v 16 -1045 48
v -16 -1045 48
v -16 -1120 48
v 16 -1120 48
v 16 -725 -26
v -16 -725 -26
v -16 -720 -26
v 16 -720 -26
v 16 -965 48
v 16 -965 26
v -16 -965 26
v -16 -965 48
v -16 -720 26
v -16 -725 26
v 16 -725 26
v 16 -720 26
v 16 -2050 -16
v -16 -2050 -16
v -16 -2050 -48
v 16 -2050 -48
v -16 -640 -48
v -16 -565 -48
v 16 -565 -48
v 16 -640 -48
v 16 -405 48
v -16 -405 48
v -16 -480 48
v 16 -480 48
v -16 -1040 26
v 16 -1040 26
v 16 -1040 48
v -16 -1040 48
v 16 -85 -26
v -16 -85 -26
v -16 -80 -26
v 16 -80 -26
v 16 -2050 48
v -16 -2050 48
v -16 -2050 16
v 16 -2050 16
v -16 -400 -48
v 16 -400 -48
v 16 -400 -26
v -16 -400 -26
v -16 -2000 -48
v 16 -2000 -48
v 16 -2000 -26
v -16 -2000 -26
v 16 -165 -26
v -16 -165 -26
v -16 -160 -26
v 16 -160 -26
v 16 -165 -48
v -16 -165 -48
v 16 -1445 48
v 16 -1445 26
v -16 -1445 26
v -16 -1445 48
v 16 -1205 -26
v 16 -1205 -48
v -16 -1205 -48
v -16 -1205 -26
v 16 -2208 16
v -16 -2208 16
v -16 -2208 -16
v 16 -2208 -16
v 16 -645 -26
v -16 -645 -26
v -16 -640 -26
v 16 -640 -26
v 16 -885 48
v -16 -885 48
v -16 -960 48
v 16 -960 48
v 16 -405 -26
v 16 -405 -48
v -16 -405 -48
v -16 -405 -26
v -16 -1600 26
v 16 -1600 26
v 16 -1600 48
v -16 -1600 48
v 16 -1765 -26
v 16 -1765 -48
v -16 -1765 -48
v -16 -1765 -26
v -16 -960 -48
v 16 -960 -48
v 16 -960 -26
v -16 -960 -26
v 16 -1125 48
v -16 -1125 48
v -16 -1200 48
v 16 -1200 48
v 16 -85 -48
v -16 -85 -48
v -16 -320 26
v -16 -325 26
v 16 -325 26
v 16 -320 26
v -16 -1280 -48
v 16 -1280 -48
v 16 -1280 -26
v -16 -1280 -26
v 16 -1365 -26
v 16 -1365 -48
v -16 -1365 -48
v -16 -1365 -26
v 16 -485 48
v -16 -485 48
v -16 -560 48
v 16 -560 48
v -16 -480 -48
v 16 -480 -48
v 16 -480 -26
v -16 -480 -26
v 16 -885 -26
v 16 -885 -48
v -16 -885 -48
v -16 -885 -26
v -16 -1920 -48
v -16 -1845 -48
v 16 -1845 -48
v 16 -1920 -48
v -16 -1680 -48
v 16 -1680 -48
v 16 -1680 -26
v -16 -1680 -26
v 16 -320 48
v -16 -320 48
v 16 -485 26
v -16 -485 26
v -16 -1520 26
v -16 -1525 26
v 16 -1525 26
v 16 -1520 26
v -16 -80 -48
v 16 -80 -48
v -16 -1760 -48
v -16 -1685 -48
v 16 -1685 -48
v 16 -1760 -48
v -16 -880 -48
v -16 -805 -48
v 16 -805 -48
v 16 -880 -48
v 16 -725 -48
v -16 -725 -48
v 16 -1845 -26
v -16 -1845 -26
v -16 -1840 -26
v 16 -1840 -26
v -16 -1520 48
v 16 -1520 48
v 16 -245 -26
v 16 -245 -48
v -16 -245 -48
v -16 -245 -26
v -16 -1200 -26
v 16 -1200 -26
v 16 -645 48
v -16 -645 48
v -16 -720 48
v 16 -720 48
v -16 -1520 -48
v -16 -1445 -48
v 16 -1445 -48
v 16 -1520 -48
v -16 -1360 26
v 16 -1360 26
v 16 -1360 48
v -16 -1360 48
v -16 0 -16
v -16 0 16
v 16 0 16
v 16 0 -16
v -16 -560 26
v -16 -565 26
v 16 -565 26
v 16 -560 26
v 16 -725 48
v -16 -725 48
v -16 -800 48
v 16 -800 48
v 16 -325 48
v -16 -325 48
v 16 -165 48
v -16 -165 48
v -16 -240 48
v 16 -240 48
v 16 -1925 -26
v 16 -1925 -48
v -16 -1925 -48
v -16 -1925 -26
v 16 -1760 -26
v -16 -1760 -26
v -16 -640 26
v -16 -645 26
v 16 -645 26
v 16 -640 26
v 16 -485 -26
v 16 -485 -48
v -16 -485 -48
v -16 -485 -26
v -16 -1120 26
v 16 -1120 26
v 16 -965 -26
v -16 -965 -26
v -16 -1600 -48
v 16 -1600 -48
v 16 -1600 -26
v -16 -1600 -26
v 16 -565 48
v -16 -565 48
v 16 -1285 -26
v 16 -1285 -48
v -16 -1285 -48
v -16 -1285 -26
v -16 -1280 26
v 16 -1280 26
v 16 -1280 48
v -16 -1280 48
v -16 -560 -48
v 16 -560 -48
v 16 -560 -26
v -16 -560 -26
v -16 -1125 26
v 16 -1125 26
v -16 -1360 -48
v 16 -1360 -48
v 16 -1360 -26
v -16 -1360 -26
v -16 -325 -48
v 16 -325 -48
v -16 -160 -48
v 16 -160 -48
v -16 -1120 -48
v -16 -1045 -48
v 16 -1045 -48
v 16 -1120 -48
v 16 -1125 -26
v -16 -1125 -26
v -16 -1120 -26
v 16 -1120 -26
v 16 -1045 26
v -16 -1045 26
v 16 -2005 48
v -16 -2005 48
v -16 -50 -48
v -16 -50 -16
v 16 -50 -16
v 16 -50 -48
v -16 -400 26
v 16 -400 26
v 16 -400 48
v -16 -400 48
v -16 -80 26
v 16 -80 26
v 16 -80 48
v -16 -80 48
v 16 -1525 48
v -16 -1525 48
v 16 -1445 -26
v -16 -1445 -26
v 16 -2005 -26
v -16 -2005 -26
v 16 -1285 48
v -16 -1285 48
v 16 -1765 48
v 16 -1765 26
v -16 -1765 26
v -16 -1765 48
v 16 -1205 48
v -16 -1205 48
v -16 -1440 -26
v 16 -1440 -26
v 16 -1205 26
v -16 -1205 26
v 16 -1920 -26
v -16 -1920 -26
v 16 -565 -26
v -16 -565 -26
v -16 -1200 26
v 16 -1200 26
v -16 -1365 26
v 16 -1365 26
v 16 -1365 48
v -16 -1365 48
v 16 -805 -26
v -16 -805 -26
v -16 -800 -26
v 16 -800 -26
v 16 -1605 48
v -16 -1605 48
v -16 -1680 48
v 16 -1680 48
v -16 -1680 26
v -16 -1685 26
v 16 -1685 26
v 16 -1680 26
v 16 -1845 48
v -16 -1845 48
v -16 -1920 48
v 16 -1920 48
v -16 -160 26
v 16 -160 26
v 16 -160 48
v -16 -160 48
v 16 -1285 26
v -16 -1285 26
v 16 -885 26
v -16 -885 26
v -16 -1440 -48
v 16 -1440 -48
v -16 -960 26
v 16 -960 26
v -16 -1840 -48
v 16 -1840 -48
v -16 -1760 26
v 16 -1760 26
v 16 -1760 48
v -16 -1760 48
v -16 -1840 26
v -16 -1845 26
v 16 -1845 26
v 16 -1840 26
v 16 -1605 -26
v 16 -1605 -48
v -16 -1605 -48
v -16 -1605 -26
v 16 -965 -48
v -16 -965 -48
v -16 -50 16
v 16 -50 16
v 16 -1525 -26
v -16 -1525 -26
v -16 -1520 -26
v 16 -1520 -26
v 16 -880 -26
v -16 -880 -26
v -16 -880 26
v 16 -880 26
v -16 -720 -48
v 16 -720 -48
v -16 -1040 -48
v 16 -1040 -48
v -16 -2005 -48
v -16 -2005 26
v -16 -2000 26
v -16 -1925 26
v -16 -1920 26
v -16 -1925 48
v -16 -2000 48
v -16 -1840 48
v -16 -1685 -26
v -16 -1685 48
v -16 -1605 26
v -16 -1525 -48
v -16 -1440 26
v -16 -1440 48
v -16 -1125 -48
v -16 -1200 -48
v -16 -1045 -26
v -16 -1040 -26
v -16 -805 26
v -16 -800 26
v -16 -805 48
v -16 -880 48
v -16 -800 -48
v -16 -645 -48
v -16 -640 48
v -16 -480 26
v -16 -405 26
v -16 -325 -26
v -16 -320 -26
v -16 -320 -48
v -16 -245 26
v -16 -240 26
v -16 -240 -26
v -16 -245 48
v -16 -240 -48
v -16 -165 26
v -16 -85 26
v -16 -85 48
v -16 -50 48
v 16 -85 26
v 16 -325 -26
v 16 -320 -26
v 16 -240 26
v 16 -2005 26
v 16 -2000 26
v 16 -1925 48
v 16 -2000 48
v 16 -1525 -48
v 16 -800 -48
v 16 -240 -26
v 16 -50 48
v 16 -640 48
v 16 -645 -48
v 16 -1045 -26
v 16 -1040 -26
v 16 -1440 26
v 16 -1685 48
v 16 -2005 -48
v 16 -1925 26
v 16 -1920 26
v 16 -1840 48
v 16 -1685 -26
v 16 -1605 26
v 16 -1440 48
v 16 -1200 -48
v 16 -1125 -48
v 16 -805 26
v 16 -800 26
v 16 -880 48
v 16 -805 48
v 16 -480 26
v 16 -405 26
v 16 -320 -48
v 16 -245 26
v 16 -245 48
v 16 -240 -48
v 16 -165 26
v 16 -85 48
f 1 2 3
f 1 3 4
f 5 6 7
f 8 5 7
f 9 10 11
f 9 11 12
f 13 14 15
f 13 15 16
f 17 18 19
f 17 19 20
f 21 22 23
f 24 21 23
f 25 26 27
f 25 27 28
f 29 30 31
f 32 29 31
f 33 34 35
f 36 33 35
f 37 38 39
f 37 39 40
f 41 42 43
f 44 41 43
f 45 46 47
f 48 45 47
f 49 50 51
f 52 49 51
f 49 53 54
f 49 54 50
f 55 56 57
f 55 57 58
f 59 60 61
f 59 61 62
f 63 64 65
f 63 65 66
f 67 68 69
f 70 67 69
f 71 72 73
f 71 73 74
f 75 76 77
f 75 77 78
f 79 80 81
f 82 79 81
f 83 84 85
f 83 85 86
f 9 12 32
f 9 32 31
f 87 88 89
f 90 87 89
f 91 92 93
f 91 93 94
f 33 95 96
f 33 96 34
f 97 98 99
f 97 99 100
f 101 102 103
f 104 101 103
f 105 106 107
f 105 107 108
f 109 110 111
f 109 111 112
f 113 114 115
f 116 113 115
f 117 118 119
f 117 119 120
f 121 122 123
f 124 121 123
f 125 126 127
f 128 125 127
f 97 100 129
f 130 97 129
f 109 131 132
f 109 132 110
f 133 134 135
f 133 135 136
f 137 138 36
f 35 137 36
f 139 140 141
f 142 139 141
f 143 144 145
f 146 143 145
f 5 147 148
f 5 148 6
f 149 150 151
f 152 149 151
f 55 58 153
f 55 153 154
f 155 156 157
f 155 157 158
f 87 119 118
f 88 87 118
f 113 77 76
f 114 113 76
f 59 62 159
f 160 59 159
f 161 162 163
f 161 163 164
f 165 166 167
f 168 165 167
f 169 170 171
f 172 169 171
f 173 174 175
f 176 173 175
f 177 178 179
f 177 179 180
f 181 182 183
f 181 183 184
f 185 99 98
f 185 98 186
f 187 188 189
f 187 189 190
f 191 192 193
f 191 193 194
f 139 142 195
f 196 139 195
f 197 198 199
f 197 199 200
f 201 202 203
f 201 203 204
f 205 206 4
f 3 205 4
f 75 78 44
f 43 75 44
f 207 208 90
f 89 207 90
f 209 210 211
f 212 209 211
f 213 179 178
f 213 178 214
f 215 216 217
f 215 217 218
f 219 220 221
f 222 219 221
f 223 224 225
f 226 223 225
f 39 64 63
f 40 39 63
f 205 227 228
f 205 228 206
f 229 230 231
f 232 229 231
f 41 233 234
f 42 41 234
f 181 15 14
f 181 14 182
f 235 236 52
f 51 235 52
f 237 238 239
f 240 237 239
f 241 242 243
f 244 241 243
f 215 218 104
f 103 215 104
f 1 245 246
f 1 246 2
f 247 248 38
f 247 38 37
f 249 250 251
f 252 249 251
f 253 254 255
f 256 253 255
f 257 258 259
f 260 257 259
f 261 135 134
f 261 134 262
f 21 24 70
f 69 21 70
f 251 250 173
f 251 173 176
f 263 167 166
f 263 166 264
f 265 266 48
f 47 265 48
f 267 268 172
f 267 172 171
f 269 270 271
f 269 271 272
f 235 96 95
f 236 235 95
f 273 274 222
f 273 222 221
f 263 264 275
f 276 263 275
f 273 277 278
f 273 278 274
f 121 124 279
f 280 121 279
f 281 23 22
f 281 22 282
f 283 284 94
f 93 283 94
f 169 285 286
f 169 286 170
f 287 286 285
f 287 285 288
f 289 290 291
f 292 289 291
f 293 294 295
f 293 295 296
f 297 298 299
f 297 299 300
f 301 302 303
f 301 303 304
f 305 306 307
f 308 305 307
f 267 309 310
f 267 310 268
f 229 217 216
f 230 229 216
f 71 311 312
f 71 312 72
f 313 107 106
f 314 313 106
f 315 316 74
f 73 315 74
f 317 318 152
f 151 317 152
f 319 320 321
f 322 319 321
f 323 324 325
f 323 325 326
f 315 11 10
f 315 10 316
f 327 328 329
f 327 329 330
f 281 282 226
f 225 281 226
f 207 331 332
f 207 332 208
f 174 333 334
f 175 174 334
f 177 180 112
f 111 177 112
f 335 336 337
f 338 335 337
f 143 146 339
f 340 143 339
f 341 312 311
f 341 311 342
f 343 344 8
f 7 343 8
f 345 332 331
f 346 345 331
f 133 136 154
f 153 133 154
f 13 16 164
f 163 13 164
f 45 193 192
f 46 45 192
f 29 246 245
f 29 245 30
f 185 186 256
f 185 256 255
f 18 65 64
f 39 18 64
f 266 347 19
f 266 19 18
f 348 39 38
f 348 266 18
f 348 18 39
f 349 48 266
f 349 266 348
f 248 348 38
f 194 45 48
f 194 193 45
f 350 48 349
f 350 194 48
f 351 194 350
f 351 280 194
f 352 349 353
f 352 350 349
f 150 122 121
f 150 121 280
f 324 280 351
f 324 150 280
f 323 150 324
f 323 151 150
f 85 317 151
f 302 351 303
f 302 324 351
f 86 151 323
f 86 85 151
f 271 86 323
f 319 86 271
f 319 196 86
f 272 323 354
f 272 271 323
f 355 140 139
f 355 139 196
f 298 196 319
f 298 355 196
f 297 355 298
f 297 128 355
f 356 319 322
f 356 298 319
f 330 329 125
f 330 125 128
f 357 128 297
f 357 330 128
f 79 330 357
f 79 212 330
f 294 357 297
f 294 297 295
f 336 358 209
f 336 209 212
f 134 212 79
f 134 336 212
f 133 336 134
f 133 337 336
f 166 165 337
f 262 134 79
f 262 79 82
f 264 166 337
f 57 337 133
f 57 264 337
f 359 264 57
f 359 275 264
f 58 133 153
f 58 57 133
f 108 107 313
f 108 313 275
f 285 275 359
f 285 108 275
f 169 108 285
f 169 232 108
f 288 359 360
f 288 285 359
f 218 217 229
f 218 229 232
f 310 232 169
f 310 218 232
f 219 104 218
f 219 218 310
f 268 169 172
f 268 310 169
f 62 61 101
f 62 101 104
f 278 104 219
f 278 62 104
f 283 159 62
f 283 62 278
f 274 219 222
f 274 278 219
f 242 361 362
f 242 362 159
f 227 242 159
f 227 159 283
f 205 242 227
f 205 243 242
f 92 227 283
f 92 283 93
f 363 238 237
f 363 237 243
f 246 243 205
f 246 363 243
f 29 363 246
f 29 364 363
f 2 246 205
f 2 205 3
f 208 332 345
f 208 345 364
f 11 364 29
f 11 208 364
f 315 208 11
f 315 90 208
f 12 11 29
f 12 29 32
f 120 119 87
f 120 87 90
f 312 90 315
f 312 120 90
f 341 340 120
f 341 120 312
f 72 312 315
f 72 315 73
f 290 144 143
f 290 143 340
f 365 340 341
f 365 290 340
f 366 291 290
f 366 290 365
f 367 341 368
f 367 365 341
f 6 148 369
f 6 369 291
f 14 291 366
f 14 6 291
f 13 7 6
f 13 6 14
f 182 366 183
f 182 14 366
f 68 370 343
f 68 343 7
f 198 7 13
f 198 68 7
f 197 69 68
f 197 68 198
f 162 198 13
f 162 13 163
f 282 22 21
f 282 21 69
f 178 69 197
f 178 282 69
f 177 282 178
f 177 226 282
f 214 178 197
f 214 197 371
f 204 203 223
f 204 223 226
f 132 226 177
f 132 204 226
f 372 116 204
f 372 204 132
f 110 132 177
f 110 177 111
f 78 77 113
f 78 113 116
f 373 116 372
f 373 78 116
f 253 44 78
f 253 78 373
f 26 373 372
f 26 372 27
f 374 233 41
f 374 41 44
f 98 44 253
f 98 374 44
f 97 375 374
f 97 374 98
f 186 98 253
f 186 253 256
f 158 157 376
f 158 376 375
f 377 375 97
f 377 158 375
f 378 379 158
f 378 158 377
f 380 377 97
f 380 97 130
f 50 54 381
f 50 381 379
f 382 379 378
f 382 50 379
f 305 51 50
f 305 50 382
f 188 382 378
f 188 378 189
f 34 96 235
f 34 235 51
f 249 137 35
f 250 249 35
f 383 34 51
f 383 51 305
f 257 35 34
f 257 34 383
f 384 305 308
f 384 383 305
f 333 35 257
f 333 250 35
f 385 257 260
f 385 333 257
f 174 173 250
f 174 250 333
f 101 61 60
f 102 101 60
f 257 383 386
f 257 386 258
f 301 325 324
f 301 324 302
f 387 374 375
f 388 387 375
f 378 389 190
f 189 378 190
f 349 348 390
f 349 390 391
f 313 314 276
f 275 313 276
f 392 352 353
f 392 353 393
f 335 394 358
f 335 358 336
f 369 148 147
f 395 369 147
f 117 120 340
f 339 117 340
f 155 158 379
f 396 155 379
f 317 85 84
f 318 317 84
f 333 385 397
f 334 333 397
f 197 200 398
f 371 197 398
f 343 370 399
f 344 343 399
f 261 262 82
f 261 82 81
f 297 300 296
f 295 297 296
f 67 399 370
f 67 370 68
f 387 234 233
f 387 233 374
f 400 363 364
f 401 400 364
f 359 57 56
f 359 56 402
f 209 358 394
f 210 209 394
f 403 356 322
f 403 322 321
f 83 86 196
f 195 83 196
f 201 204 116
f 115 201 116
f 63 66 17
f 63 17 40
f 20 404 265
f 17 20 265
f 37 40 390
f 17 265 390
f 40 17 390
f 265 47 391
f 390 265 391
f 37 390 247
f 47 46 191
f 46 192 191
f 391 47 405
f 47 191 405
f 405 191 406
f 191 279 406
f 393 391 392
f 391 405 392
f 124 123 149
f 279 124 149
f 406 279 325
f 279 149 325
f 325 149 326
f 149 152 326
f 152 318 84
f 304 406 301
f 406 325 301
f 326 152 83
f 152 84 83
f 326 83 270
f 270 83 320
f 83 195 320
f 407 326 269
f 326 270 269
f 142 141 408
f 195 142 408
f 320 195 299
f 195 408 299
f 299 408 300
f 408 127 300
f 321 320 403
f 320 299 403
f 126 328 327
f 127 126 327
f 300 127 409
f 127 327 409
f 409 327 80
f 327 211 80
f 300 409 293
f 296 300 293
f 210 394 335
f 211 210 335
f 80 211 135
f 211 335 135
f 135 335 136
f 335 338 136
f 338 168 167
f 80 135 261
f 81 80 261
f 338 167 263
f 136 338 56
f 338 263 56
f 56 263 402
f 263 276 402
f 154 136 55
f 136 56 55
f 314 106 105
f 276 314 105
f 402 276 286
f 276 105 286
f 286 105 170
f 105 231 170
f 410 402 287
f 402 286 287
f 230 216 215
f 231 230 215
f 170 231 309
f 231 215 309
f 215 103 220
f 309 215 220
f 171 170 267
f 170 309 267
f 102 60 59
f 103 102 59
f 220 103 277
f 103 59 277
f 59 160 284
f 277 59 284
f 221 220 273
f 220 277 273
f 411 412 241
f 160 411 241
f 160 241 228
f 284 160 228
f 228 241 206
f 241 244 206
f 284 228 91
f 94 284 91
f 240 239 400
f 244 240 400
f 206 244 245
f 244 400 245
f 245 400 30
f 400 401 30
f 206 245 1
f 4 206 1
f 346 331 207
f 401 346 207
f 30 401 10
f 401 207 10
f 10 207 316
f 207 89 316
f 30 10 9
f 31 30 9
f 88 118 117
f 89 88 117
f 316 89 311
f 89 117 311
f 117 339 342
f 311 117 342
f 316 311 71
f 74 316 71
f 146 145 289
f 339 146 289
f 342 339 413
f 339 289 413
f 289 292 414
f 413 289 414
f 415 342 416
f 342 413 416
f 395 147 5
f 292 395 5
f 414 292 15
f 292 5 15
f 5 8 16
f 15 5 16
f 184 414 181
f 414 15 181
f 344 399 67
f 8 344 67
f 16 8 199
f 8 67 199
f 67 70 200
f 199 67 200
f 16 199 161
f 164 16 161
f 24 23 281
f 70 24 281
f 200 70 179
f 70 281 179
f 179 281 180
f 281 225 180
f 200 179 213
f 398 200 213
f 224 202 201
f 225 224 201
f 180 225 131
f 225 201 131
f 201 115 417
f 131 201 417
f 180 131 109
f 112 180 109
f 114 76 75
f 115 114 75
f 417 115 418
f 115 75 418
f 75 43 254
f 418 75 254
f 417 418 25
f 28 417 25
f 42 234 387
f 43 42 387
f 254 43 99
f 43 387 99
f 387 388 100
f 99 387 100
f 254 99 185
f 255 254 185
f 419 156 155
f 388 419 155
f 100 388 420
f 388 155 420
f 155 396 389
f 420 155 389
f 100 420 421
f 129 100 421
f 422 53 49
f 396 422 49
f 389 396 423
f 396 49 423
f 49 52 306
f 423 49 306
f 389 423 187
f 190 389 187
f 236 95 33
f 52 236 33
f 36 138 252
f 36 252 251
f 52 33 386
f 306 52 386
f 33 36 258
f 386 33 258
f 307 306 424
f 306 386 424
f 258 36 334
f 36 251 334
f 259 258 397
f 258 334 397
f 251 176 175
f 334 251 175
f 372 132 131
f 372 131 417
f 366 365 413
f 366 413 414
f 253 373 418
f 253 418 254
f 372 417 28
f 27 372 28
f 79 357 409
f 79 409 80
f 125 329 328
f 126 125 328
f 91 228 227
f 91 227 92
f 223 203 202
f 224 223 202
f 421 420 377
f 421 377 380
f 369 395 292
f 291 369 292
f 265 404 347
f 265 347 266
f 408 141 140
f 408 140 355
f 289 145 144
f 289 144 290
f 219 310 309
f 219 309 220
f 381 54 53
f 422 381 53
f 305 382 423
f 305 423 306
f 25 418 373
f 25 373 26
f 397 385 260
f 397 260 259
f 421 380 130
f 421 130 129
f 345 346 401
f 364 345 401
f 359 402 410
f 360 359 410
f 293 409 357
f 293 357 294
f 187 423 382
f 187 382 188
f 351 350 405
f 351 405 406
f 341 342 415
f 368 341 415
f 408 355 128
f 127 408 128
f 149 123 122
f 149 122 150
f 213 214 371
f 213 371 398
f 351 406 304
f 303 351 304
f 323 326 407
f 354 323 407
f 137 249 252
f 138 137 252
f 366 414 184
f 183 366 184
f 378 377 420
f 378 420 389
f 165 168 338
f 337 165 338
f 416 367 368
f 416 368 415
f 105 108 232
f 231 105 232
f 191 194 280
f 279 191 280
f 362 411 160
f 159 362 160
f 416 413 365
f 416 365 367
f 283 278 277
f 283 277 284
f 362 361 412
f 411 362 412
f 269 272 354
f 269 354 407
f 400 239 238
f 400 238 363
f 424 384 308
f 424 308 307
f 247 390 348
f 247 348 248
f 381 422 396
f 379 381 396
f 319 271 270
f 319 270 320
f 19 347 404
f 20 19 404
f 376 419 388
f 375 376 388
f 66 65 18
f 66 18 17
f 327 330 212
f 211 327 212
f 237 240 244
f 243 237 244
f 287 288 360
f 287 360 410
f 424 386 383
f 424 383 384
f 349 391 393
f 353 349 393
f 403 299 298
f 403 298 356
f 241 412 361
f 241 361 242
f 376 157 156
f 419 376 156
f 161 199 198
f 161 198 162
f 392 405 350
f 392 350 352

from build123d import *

# Parameters (mm, degrees)
F0_W     = 32
F0_H     = 32
F1_DEPTH = 2208
F3_W     = 32
F3_H     = 32
F4_DEPTH = 2000
F5_W     = 5
F5_H     = 22
F6_DEPTH = 32


with BuildPart() as f1:
    # F0 (on Front) → F1 (new body)
    with BuildSketch(Plane.XZ):
        Rectangle(F0_W, F0_H)
    extrude(amount=F1_DEPTH)

    # F3 (on offset) → F4 (join)
    with BuildSketch(Plane.XZ.offset(50)):
        with Locations((0, 32)):
            Rectangle(F3_W, F3_H)
        with Locations((0, -32)):
            Rectangle(F3_W, F3_H)
    extrude(amount=F4_DEPTH)

    # F5 (on face) → F6 (cut)
    with BuildSketch(Plane.YZ.offset(16)):
        with Locations((-82.5, 37)):
            Rectangle(F5_W, F5_H)
        with Locations((-82.5, -37)):
            Rectangle(F5_W, F5_H)
        with Locations((-162.5, 37)):
            Rectangle(F5_W, F5_H)
        with Locations((-162.5, -37)):
            Rectangle(F5_W, F5_H)
        with Locations((-242.5, 37)):
            Rectangle(F5_W, F5_H)
        with Locations((-242.5, -37)):
            Rectangle(F5_W, F5_H)
        with Locations((-322.5, 37)):
            Rectangle(F5_W, F5_H)
        with Locations((-322.5, -37)):
            Rectangle(F5_W, F5_H)
        with Locations((-402.5, 37)):
            Rectangle(F5_W, F5_H)
        with Locations((-402.5, -37)):
            Rectangle(F5_W, F5_H)
        with Locations((-482.5, 37)):
            Rectangle(F5_W, F5_H)
        with Locations((-482.5, -37)):
            Rectangle(F5_W, F5_H)
        with Locations((-562.5, 37)):
            Rectangle(F5_W, F5_H)
        with Locations((-562.5, -37)):
            Rectangle(F5_W, F5_H)
        with Locations((-642.5, 37)):
            Rectangle(F5_W, F5_H)
        with Locations((-642.5, -37)):
            Rectangle(F5_W, F5_H)
        with Locations((-722.5, 37)):
            Rectangle(F5_W, F5_H)
        with Locations((-722.5, -37)):
            Rectangle(F5_W, F5_H)
        with Locations((-802.5, 37)):
            Rectangle(F5_W, F5_H)
        with Locations((-802.5, -37)):
            Rectangle(F5_W, F5_H)
        with Locations((-882.5, 37)):
            Rectangle(F5_W, F5_H)
        with Locations((-882.5, -37)):
            Rectangle(F5_W, F5_H)
        with Locations((-962.5, 37)):
            Rectangle(F5_W, F5_H)
        with Locations((-962.5, -37)):
            Rectangle(F5_W, F5_H)
        with Locations((-1042.5, 37)):
            Rectangle(F5_W, F5_H)
        with Locations((-1042.5, -37)):
            Rectangle(F5_W, F5_H)
        with Locations((-1122.5, 37)):
            Rectangle(F5_W, F5_H)
        with Locations((-1122.5, -37)):
            Rectangle(F5_W, F5_H)
        with Locations((-1202.5, 37)):
            Rectangle(F5_W, F5_H)
        with Locations((-1202.5, -37)):
            Rectangle(F5_W, F5_H)
        with Locations((-1282.5, 37)):
            Rectangle(F5_W, F5_H)
        with Locations((-1282.5, -37)):
            Rectangle(F5_W, F5_H)
        with Locations((-1362.5, 37)):
            Rectangle(F5_W, F5_H)
        with Locations((-1362.5, -37)):
            Rectangle(F5_W, F5_H)
        with Locations((-1442.5, 37)):
            Rectangle(F5_W, F5_H)
        with Locations((-1442.5, -37)):
            Rectangle(F5_W, F5_H)
        with Locations((-1522.5, 37)):
            Rectangle(F5_W, F5_H)
        with Locations((-1522.5, -37)):
            Rectangle(F5_W, F5_H)
        with Locations((-1602.5, 37)):
            Rectangle(F5_W, F5_H)
        with Locations((-1602.5, -37)):
            Rectangle(F5_W, F5_H)
        with Locations((-1682.5, 37)):
            Rectangle(F5_W, F5_H)
        with Locations((-1682.5, -37)):
            Rectangle(F5_W, F5_H)
        with Locations((-1762.5, 37)):
            Rectangle(F5_W, F5_H)
        with Locations((-1762.5, -37)):
            Rectangle(F5_W, F5_H)
        with Locations((-1842.5, 37)):
            Rectangle(F5_W, F5_H)
        with Locations((-1842.5, -37)):
            Rectangle(F5_W, F5_H)
        with Locations((-1922.5, 37)):
            Rectangle(F5_W, F5_H)
        with Locations((-1922.5, -37)):
            Rectangle(F5_W, F5_H)
        with Locations((-2002.5, 37)):
            Rectangle(F5_W, F5_H)
        with Locations((-2002.5, -37)):
            Rectangle(F5_W, F5_H)
    extrude(amount=-F6_DEPTH, mode=Mode.SUBTRACT)


solid = f1.part
